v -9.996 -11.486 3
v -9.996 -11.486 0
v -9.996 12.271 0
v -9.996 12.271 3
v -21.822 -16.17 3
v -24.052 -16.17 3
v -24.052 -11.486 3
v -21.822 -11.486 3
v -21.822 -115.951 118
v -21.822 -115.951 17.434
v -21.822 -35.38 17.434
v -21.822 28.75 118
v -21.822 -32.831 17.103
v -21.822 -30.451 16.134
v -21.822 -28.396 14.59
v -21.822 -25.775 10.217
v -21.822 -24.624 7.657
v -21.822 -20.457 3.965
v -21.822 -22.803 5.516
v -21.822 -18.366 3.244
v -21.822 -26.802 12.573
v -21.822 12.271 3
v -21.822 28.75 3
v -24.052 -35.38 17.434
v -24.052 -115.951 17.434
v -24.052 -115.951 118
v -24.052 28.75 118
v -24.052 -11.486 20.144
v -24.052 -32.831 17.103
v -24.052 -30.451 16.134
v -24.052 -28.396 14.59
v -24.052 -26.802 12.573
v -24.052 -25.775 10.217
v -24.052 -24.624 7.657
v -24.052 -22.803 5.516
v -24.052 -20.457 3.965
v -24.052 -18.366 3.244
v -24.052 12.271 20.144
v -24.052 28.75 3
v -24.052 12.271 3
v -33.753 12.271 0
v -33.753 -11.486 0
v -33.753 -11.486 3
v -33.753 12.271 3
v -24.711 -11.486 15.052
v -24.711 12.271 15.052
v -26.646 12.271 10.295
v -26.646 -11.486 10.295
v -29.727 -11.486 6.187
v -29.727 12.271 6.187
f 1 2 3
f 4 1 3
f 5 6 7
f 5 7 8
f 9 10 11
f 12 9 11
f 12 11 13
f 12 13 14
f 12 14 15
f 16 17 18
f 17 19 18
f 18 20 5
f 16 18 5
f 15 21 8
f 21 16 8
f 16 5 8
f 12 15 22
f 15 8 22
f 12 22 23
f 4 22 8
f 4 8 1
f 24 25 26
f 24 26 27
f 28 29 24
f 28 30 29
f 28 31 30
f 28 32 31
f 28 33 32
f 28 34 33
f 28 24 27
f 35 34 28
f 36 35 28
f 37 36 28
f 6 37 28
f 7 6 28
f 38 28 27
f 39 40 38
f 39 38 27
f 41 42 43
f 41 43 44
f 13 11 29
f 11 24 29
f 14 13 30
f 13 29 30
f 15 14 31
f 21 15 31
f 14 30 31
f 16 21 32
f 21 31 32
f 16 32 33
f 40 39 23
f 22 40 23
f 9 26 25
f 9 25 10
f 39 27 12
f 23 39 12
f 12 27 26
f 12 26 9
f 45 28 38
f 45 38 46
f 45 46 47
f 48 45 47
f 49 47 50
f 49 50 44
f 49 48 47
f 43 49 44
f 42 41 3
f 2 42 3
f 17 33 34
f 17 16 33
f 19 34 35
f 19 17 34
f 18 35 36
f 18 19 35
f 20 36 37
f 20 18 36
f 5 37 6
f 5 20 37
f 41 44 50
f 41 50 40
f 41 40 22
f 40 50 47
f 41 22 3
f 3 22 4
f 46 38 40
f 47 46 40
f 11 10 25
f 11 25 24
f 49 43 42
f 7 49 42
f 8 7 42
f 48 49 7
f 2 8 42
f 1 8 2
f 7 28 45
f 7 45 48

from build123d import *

# Parameters (mm, degrees)
SKETCH_1_W          = 23.757047591
SKETCH_1_H          = 23.75704759
EXTRUDE_1_DEPTH     = 3
SKETCH_2_W          = 2.229782935
SKETCH_2_H          = 144.701322111
EXTRUDE_2_DEPTH     = 115
FILLET_1_R          = 20
SKETCH_3_W          = 17.433740909
SKETCH_3_H          = 91.487428691
CUT_EXTRUDE_1_DEPTH = 75
FILLET_2_R          = 10
FILLET_3_R          = 10


with BuildPart() as part:
    # 草图1 → 凸台-拉伸1 (new body)
    with BuildSketch(Plane.XY):
        with Locations((-21.874536556, 0.392800792)):
            Rectangle(SKETCH_1_W, SKETCH_1_H)
    extrude(amount=EXTRUDE_1_DEPTH)

    # 草图2 → 凸台-拉伸2 (add)
    with BuildSketch(Plane.XY.offset(3)):
        with Locations((-22.937382742, -43.600525925)):
            Rectangle(SKETCH_2_W, SKETCH_2_H)
    extrude(amount=EXTRUDE_2_DEPTH)

    # 圆角1
    # the kernel refuses this fillet: 20 mm, written as the material it adds along each edge
    with BuildSketch(Plane(origin=(-24.052274209, -11.485723003, 3), x_dir=(-1, 0, 0), z_dir=(0, 1, 0))) as fillet_1_piece_1:
        with BuildLine():
            CenterArc((20, 17.144275835), FILLET_1_R, 180, 59.005172318)
            Line((0, 17.144275835), (0, 0))
            Line((0, 0), (9.700786142, 0))
        make_face()
    extrude(amount=23.75704759)

    # 草图3 → 切除-拉伸1 (cut)
    with BuildSketch(Plane(origin=(-21.822491274, 0, 0), x_dir=(0, 0, -1), z_dir=(1, 0, 0))):
        with Locations((-8.716870455, -71.123991133)):
            Rectangle(SKETCH_3_W, SKETCH_3_H)
    extrude(amount=-CUT_EXTRUDE_1_DEPTH, mode=Mode.SUBTRACT)

    # 圆角2
    fillet_2_edges = [part.edges().sort_by_distance(p)[0] for p in [
        (-22.937382741, -25.380276788, 17.433740909),
    ]]
    fillet(fillet_2_edges, radius=FILLET_2_R)

    # 圆角3
    fillet_3_edges = [part.edges().sort_by_distance(p)[0] for p in [
        (-22.937382741, -25.380276788, 3),
    ]]
    fillet(fillet_3_edges, radius=FILLET_3_R)


solid = part.part
